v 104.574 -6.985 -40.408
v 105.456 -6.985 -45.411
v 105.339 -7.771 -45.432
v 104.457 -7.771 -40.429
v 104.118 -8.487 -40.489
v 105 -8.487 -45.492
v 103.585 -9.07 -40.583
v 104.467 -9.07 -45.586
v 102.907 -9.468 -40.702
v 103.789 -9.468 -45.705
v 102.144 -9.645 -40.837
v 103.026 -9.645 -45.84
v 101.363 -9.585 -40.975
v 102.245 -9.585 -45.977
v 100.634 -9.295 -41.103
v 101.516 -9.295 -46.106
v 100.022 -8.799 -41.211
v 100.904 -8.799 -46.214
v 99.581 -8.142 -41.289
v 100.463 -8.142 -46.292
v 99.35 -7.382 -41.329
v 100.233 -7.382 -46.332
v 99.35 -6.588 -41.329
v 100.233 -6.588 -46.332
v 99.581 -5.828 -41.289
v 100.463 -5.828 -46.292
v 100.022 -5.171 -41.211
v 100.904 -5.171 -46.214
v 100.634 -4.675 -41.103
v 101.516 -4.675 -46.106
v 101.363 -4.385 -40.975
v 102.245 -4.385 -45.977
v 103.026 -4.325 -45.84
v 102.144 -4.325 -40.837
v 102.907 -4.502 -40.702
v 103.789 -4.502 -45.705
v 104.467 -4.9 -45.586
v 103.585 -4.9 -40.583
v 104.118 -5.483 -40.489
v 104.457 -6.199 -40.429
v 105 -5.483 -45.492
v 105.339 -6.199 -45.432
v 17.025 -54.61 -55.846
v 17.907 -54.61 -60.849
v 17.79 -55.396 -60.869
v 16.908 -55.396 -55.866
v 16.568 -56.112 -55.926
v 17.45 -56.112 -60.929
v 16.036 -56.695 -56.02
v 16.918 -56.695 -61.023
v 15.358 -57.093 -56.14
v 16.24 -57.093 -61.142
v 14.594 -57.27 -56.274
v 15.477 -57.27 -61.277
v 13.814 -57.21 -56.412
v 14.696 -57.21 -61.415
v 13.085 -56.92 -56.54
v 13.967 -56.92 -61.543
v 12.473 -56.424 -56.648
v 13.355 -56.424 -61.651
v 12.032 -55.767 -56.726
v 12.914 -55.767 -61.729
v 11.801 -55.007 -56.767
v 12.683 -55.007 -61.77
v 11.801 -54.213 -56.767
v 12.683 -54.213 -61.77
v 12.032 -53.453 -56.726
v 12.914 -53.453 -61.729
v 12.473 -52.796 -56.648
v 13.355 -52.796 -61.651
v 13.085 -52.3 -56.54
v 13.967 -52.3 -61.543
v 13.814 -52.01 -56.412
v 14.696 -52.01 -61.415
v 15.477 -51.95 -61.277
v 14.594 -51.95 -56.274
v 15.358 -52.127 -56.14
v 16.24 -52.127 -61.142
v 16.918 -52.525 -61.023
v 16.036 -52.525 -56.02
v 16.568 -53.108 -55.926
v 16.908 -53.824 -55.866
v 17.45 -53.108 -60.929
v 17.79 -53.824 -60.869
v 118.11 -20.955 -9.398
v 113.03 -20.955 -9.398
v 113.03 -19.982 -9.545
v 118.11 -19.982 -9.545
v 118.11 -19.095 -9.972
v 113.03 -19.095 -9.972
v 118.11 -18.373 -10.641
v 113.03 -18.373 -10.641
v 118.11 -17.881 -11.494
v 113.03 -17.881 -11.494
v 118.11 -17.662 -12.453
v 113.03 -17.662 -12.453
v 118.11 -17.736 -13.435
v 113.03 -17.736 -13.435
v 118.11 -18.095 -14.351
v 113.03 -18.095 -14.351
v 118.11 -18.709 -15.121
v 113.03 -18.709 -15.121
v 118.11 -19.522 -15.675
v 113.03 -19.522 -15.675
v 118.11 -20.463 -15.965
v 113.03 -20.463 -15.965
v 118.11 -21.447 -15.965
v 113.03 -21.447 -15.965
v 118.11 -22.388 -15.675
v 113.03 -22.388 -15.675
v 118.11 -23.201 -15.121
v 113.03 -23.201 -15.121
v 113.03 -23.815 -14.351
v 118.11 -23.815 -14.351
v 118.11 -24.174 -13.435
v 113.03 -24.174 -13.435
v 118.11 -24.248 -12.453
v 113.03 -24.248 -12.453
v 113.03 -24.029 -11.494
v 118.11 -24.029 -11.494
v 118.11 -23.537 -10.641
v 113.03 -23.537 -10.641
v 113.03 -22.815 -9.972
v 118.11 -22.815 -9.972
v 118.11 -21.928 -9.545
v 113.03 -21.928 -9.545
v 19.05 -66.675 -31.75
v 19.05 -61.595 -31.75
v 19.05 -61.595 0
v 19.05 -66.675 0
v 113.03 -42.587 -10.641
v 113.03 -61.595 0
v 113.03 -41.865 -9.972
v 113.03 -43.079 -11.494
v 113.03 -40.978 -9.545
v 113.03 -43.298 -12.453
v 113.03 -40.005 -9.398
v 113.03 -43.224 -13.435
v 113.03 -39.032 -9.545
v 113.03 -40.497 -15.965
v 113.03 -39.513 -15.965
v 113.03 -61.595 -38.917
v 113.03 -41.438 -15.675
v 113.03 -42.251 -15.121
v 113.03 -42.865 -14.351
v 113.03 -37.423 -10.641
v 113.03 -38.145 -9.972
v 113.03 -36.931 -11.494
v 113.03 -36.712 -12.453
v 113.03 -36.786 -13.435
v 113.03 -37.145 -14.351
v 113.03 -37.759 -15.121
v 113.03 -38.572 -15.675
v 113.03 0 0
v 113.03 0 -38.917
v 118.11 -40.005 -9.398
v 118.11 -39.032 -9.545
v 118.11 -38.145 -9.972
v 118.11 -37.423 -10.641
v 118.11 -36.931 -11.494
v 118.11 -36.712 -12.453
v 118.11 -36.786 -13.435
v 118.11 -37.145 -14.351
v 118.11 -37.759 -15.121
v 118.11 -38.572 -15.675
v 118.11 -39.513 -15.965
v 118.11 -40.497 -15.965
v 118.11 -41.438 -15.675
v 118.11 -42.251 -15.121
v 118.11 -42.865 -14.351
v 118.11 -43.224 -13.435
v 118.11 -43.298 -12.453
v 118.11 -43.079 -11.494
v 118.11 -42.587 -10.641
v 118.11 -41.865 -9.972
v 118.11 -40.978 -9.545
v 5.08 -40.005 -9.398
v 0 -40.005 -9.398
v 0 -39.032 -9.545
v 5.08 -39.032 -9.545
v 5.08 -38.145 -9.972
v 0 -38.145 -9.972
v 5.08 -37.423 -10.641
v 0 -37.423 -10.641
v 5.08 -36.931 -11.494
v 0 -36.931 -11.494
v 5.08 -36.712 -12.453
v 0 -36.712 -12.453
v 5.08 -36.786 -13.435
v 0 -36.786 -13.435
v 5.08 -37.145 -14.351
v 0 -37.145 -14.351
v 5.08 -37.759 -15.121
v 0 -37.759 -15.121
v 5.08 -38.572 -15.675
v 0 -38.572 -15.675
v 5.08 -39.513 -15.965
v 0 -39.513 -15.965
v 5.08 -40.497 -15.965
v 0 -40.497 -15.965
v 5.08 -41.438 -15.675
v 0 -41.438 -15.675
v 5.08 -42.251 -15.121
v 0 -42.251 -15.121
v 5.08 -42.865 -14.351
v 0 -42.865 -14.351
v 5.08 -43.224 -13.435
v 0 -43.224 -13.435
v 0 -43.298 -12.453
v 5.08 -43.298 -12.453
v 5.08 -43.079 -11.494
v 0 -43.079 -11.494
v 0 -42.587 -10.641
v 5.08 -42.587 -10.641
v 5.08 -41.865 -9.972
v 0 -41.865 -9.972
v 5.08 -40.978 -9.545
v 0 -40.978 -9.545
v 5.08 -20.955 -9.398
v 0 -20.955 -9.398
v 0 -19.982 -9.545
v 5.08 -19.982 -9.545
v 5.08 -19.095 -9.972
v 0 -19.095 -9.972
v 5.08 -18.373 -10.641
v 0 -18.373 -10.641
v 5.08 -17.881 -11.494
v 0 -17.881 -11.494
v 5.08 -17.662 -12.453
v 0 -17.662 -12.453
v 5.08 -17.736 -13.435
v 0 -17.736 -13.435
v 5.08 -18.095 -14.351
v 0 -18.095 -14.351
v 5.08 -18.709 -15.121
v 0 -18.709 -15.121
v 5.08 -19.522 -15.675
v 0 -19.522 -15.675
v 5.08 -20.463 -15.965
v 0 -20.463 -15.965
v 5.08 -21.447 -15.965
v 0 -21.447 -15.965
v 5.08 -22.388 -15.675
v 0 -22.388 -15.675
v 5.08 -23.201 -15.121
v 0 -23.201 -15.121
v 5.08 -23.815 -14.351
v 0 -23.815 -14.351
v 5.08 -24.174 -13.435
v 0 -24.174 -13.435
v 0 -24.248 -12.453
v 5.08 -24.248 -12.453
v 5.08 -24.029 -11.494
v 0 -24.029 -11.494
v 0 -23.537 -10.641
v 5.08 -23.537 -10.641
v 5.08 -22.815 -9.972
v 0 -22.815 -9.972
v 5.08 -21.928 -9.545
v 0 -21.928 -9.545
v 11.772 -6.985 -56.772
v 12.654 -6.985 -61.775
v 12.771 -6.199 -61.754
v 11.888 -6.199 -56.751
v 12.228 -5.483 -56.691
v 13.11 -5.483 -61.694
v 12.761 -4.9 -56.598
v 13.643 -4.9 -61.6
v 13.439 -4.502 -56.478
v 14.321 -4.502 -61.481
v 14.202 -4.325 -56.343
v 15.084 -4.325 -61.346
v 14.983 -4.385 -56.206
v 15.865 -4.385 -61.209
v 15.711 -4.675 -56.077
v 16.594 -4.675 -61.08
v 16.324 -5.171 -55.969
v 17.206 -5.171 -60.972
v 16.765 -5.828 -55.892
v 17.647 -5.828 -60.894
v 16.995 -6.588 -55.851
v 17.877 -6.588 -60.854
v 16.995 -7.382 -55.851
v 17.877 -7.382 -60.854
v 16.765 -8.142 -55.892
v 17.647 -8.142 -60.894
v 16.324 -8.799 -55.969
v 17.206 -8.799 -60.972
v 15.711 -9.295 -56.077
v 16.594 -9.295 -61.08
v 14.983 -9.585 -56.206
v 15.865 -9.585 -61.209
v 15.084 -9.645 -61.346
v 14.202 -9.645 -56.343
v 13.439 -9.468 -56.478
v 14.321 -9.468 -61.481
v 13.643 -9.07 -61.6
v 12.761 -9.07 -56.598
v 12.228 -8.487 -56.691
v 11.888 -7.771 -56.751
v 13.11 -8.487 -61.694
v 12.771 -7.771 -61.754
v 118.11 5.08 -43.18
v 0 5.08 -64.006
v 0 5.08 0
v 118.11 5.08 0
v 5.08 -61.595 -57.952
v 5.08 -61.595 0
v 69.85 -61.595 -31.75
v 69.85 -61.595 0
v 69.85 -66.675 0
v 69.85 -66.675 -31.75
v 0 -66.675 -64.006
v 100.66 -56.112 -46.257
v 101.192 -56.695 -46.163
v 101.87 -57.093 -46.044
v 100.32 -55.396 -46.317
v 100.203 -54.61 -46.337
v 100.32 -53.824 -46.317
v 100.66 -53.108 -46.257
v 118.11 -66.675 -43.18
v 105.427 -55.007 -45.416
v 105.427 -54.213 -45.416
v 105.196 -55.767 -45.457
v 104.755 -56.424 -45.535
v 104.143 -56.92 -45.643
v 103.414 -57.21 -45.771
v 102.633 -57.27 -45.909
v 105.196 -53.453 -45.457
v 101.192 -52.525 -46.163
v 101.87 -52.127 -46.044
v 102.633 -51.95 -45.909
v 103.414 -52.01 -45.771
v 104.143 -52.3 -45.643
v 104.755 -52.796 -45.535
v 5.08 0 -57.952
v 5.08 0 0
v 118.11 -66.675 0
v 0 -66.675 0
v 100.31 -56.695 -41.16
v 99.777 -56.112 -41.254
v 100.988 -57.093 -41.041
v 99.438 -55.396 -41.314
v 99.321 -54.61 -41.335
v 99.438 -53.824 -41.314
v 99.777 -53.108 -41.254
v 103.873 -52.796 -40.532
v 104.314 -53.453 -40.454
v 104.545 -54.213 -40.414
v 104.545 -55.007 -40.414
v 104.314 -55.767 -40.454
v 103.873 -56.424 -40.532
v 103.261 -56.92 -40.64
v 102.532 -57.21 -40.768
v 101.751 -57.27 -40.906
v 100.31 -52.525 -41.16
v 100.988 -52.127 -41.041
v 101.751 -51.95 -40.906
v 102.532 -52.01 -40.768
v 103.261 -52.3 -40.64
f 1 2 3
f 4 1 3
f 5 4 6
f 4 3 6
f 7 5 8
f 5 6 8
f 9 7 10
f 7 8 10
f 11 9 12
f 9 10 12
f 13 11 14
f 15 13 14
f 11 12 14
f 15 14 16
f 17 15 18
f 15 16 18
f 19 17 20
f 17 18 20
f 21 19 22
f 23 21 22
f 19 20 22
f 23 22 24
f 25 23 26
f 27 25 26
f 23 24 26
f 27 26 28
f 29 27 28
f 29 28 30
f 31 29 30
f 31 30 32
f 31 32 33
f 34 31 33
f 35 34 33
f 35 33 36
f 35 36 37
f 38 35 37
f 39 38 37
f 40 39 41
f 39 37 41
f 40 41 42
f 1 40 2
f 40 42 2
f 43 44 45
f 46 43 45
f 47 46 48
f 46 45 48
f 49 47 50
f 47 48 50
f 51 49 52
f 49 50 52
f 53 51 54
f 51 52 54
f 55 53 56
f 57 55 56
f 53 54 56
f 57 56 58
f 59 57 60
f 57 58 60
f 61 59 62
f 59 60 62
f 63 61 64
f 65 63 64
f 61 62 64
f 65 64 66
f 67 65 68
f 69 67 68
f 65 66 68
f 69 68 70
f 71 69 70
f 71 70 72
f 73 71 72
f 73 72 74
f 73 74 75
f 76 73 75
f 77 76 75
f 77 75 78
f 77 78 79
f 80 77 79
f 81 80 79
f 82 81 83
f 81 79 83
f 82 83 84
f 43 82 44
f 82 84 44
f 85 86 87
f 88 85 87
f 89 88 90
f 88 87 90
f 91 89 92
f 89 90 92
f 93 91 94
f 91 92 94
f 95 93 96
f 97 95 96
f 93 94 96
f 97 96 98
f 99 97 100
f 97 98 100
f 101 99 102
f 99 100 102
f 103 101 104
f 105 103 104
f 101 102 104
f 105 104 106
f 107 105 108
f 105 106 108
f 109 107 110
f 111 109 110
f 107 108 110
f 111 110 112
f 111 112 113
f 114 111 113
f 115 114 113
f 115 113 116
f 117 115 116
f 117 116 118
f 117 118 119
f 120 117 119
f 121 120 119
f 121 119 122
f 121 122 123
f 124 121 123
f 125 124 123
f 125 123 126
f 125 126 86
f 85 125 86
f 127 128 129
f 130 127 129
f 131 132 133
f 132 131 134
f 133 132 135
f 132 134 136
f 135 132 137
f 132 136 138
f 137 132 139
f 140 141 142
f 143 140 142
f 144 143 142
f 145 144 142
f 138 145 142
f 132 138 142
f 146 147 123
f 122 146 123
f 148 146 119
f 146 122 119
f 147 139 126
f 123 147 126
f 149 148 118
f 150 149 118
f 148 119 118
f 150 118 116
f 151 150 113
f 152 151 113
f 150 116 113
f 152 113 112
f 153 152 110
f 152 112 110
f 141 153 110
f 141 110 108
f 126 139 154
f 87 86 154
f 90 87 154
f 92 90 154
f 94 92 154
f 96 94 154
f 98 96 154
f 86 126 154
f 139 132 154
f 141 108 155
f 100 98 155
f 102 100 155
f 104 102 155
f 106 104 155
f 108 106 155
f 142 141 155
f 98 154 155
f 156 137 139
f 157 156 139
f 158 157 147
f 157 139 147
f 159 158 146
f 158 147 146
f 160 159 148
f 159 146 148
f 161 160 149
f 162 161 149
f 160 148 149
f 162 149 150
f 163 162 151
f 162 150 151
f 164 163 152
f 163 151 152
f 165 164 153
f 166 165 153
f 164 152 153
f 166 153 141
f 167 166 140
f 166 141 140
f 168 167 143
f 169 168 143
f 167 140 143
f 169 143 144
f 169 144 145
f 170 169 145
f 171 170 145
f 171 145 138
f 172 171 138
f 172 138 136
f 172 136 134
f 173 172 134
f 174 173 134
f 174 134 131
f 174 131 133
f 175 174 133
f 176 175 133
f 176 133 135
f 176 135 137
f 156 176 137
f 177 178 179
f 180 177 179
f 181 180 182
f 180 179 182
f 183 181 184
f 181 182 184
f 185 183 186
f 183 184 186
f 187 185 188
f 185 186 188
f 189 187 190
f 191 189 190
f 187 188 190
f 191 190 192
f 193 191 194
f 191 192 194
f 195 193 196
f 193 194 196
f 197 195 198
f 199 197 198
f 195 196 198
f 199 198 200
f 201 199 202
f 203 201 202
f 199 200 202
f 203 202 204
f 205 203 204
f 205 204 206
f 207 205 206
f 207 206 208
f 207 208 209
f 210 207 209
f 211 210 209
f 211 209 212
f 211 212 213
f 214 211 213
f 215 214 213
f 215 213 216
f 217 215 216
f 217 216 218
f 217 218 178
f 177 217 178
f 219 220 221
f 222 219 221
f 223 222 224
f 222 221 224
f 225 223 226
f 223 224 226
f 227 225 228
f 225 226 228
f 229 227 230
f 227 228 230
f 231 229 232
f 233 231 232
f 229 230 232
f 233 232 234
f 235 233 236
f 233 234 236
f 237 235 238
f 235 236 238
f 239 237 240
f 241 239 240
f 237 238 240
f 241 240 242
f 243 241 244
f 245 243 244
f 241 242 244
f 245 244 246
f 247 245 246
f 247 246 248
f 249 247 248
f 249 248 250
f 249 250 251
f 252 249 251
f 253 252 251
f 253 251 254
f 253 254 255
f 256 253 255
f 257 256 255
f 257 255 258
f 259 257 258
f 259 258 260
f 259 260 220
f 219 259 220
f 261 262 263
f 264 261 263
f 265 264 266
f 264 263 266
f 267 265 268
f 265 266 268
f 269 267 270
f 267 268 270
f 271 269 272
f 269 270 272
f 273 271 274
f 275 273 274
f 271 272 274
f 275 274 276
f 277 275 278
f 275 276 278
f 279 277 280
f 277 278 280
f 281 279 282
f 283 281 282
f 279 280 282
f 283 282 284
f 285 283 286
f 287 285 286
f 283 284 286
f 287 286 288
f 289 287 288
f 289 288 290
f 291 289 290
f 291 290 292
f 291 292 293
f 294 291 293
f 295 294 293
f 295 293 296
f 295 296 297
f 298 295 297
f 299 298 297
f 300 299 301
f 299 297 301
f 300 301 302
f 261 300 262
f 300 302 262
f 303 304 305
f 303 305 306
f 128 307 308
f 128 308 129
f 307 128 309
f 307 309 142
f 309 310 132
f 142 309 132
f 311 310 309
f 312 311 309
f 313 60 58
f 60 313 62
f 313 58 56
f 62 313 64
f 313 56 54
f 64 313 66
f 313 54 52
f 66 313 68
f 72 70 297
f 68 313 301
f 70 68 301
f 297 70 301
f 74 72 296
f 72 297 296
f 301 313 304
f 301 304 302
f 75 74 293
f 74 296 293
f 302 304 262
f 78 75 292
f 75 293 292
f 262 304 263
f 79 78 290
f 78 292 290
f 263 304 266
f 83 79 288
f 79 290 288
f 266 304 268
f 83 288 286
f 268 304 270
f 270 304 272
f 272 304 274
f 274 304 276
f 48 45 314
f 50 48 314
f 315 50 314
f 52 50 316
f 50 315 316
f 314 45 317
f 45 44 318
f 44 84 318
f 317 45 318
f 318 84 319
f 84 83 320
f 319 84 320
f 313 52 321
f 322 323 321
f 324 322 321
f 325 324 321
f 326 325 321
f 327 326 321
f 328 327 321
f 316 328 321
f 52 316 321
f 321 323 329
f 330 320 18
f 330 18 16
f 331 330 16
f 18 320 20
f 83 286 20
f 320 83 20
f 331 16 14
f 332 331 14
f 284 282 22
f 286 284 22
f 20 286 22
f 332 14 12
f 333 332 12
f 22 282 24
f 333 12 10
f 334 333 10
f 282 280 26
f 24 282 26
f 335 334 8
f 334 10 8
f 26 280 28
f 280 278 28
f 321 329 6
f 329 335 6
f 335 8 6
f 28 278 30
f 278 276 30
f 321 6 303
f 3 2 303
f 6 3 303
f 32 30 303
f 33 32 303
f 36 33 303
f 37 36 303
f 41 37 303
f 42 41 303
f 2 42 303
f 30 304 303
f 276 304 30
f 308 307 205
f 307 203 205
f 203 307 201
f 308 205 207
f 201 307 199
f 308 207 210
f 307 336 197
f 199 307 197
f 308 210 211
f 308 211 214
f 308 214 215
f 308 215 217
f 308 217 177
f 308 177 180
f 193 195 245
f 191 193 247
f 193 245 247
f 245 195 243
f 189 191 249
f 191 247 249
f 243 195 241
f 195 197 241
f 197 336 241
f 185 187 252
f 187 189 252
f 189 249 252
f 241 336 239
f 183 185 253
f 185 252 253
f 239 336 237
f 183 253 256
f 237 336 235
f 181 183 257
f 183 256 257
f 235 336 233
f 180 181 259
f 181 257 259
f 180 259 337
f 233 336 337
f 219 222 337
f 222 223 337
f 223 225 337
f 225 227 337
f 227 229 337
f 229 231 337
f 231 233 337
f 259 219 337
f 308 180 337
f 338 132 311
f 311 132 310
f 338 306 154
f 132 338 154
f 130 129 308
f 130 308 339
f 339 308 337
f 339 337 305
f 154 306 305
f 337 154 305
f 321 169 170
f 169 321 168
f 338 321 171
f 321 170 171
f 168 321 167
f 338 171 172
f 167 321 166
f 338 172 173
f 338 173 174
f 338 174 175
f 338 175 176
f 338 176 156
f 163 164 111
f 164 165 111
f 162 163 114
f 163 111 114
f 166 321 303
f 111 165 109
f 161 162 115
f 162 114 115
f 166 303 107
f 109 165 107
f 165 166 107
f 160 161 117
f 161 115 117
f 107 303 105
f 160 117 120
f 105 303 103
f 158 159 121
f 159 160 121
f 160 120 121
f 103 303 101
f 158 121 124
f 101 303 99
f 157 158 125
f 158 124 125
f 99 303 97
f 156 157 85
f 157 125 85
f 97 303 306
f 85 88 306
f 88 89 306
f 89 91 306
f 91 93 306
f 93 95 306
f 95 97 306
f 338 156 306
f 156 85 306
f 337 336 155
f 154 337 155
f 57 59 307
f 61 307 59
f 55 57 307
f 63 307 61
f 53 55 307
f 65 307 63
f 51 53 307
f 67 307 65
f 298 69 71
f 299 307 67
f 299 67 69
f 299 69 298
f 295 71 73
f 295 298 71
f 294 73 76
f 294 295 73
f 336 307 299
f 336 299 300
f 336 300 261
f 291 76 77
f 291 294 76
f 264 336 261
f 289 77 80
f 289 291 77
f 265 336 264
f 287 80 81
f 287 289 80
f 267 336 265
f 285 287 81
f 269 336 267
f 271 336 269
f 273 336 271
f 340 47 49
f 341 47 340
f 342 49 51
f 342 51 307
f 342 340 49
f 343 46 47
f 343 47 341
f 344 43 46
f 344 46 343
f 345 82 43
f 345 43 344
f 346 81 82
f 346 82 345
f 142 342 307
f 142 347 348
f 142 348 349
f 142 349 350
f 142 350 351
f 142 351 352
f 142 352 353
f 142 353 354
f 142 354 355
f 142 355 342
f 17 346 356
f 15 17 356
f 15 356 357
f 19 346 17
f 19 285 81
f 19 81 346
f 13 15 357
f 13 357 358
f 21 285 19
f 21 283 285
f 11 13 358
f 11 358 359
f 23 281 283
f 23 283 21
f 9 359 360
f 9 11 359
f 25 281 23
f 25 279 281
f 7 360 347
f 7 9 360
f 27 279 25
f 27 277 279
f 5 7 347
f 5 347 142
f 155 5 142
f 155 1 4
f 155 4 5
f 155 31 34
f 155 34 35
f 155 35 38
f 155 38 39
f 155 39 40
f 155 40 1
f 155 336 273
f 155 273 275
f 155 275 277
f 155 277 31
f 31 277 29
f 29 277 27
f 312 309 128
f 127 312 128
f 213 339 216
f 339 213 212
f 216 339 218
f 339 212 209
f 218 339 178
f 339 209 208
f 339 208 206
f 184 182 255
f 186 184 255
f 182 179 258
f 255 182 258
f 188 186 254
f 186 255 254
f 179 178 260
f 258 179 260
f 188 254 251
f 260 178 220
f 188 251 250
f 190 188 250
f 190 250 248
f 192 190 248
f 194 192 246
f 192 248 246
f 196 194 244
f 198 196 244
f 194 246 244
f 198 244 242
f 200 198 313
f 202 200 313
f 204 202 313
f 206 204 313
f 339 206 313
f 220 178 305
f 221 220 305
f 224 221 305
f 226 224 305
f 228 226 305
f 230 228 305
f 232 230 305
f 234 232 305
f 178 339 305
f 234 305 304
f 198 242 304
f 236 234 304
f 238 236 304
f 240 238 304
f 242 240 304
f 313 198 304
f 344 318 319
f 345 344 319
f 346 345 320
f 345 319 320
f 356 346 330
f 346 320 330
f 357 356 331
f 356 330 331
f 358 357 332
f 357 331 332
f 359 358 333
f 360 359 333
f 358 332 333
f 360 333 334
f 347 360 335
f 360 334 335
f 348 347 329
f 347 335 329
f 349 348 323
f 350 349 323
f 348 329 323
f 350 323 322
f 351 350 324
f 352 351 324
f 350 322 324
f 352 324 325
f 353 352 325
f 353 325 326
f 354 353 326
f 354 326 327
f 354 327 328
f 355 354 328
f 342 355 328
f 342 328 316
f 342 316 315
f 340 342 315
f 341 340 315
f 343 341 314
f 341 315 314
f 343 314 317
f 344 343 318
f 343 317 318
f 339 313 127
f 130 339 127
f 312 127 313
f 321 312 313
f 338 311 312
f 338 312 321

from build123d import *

# Parameters (mm, degrees)
BOSS_EXTRUDE1_DEPTH = 5.08
BOSS_EXTRUDE2_DEPTH = 61.595
BOSS_EXTRUDE3_DEPTH = 5.08
SKETCH4_R           = 3.302
CUT_EXTRUDE1_DEPTH  = 150.974308337
SKETCH5_R           = 2.667
CUT_EXTRUDE2_DEPTH  = 5.08


with BuildPart() as part:
    # Sketch1 → Boss-Extrude1 (new body)
    with BuildSketch(Plane(origin=(0, 0, 0), x_dir=(1, 0, 0), z_dir=(0, 1, 0))):
        Polygon((0, 64.005979691), (0, 43.18), (0, 0), (118.11, 0), (118.11, 43.18), align=None)
    extrude(amount=BOSS_EXTRUDE1_DEPTH)

    # Sketch2 → Boss-Extrude2 (add)
    with BuildSketch(Plane.XZ):
        Polygon((5.08, -5.08), (5.08, -57.951871441), (113.03, -38.917373874), (113.03, -5.08), (113.03, 0), (118.11, 0), (118.11, -43.18), (0, -64.005979691), (0, 0), (5.08, 0), align=None)
    extrude(amount=BOSS_EXTRUDE2_DEPTH)

    # Sketch3 → Boss-Extrude3 (add)
    with BuildSketch(Plane.XZ.offset(61.595)):
        Polygon((113.03, 0), (69.85, 0), (69.85, -31.75), (19.05, -31.75), (19.05, 0), (5.08, 0), (5.08, -57.951871441), (113.03, -38.917373874), align=None)
        Polygon((0, -64.005979691), (118.11, -43.18), (118.11, 0), (113.03, 0), (113.03, -38.917373874), (5.08, -57.951871441), (5.08, 0), (0, 0), align=None)
    extrude(amount=BOSS_EXTRUDE3_DEPTH)

    # Sketch4 → Cut-Extrude1 (cut, through all)
    with BuildSketch(Plane.ZY):
        with Locations((-12.7, -20.955)):
            Circle(SKETCH4_R)
        with Locations((-12.7, -40.005)):
            Circle(SKETCH4_R)
    extrude(amount=-CUT_EXTRUDE1_DEPTH, mode=Mode.SUBTRACT)

    # Sketch5 → Cut-Extrude2 (cut)
    with BuildSketch(Plane(origin=(10.945667174, 0, -62.075963247), x_dir=(-0.9848077530122081, 0, -0.17364817766693075), z_dir=(0.17364817766693075, 0, -0.9848077530122081))):
        with Locations(Location((-93.301496832, -6.985, 0), (0, 0, 180))):
            Circle(SKETCH5_R)
        with Locations((-93.301496832, -54.61)):
            Circle(SKETCH5_R)
        with Locations((-4.401496832, -6.985)):
            Circle(SKETCH5_R)
        with Locations(Location((-4.401496832, -54.61, 0), (0, 0, 180))):
            Circle(SKETCH5_R)
    extrude(amount=-CUT_EXTRUDE2_DEPTH, mode=Mode.SUBTRACT)


solid = part.part
